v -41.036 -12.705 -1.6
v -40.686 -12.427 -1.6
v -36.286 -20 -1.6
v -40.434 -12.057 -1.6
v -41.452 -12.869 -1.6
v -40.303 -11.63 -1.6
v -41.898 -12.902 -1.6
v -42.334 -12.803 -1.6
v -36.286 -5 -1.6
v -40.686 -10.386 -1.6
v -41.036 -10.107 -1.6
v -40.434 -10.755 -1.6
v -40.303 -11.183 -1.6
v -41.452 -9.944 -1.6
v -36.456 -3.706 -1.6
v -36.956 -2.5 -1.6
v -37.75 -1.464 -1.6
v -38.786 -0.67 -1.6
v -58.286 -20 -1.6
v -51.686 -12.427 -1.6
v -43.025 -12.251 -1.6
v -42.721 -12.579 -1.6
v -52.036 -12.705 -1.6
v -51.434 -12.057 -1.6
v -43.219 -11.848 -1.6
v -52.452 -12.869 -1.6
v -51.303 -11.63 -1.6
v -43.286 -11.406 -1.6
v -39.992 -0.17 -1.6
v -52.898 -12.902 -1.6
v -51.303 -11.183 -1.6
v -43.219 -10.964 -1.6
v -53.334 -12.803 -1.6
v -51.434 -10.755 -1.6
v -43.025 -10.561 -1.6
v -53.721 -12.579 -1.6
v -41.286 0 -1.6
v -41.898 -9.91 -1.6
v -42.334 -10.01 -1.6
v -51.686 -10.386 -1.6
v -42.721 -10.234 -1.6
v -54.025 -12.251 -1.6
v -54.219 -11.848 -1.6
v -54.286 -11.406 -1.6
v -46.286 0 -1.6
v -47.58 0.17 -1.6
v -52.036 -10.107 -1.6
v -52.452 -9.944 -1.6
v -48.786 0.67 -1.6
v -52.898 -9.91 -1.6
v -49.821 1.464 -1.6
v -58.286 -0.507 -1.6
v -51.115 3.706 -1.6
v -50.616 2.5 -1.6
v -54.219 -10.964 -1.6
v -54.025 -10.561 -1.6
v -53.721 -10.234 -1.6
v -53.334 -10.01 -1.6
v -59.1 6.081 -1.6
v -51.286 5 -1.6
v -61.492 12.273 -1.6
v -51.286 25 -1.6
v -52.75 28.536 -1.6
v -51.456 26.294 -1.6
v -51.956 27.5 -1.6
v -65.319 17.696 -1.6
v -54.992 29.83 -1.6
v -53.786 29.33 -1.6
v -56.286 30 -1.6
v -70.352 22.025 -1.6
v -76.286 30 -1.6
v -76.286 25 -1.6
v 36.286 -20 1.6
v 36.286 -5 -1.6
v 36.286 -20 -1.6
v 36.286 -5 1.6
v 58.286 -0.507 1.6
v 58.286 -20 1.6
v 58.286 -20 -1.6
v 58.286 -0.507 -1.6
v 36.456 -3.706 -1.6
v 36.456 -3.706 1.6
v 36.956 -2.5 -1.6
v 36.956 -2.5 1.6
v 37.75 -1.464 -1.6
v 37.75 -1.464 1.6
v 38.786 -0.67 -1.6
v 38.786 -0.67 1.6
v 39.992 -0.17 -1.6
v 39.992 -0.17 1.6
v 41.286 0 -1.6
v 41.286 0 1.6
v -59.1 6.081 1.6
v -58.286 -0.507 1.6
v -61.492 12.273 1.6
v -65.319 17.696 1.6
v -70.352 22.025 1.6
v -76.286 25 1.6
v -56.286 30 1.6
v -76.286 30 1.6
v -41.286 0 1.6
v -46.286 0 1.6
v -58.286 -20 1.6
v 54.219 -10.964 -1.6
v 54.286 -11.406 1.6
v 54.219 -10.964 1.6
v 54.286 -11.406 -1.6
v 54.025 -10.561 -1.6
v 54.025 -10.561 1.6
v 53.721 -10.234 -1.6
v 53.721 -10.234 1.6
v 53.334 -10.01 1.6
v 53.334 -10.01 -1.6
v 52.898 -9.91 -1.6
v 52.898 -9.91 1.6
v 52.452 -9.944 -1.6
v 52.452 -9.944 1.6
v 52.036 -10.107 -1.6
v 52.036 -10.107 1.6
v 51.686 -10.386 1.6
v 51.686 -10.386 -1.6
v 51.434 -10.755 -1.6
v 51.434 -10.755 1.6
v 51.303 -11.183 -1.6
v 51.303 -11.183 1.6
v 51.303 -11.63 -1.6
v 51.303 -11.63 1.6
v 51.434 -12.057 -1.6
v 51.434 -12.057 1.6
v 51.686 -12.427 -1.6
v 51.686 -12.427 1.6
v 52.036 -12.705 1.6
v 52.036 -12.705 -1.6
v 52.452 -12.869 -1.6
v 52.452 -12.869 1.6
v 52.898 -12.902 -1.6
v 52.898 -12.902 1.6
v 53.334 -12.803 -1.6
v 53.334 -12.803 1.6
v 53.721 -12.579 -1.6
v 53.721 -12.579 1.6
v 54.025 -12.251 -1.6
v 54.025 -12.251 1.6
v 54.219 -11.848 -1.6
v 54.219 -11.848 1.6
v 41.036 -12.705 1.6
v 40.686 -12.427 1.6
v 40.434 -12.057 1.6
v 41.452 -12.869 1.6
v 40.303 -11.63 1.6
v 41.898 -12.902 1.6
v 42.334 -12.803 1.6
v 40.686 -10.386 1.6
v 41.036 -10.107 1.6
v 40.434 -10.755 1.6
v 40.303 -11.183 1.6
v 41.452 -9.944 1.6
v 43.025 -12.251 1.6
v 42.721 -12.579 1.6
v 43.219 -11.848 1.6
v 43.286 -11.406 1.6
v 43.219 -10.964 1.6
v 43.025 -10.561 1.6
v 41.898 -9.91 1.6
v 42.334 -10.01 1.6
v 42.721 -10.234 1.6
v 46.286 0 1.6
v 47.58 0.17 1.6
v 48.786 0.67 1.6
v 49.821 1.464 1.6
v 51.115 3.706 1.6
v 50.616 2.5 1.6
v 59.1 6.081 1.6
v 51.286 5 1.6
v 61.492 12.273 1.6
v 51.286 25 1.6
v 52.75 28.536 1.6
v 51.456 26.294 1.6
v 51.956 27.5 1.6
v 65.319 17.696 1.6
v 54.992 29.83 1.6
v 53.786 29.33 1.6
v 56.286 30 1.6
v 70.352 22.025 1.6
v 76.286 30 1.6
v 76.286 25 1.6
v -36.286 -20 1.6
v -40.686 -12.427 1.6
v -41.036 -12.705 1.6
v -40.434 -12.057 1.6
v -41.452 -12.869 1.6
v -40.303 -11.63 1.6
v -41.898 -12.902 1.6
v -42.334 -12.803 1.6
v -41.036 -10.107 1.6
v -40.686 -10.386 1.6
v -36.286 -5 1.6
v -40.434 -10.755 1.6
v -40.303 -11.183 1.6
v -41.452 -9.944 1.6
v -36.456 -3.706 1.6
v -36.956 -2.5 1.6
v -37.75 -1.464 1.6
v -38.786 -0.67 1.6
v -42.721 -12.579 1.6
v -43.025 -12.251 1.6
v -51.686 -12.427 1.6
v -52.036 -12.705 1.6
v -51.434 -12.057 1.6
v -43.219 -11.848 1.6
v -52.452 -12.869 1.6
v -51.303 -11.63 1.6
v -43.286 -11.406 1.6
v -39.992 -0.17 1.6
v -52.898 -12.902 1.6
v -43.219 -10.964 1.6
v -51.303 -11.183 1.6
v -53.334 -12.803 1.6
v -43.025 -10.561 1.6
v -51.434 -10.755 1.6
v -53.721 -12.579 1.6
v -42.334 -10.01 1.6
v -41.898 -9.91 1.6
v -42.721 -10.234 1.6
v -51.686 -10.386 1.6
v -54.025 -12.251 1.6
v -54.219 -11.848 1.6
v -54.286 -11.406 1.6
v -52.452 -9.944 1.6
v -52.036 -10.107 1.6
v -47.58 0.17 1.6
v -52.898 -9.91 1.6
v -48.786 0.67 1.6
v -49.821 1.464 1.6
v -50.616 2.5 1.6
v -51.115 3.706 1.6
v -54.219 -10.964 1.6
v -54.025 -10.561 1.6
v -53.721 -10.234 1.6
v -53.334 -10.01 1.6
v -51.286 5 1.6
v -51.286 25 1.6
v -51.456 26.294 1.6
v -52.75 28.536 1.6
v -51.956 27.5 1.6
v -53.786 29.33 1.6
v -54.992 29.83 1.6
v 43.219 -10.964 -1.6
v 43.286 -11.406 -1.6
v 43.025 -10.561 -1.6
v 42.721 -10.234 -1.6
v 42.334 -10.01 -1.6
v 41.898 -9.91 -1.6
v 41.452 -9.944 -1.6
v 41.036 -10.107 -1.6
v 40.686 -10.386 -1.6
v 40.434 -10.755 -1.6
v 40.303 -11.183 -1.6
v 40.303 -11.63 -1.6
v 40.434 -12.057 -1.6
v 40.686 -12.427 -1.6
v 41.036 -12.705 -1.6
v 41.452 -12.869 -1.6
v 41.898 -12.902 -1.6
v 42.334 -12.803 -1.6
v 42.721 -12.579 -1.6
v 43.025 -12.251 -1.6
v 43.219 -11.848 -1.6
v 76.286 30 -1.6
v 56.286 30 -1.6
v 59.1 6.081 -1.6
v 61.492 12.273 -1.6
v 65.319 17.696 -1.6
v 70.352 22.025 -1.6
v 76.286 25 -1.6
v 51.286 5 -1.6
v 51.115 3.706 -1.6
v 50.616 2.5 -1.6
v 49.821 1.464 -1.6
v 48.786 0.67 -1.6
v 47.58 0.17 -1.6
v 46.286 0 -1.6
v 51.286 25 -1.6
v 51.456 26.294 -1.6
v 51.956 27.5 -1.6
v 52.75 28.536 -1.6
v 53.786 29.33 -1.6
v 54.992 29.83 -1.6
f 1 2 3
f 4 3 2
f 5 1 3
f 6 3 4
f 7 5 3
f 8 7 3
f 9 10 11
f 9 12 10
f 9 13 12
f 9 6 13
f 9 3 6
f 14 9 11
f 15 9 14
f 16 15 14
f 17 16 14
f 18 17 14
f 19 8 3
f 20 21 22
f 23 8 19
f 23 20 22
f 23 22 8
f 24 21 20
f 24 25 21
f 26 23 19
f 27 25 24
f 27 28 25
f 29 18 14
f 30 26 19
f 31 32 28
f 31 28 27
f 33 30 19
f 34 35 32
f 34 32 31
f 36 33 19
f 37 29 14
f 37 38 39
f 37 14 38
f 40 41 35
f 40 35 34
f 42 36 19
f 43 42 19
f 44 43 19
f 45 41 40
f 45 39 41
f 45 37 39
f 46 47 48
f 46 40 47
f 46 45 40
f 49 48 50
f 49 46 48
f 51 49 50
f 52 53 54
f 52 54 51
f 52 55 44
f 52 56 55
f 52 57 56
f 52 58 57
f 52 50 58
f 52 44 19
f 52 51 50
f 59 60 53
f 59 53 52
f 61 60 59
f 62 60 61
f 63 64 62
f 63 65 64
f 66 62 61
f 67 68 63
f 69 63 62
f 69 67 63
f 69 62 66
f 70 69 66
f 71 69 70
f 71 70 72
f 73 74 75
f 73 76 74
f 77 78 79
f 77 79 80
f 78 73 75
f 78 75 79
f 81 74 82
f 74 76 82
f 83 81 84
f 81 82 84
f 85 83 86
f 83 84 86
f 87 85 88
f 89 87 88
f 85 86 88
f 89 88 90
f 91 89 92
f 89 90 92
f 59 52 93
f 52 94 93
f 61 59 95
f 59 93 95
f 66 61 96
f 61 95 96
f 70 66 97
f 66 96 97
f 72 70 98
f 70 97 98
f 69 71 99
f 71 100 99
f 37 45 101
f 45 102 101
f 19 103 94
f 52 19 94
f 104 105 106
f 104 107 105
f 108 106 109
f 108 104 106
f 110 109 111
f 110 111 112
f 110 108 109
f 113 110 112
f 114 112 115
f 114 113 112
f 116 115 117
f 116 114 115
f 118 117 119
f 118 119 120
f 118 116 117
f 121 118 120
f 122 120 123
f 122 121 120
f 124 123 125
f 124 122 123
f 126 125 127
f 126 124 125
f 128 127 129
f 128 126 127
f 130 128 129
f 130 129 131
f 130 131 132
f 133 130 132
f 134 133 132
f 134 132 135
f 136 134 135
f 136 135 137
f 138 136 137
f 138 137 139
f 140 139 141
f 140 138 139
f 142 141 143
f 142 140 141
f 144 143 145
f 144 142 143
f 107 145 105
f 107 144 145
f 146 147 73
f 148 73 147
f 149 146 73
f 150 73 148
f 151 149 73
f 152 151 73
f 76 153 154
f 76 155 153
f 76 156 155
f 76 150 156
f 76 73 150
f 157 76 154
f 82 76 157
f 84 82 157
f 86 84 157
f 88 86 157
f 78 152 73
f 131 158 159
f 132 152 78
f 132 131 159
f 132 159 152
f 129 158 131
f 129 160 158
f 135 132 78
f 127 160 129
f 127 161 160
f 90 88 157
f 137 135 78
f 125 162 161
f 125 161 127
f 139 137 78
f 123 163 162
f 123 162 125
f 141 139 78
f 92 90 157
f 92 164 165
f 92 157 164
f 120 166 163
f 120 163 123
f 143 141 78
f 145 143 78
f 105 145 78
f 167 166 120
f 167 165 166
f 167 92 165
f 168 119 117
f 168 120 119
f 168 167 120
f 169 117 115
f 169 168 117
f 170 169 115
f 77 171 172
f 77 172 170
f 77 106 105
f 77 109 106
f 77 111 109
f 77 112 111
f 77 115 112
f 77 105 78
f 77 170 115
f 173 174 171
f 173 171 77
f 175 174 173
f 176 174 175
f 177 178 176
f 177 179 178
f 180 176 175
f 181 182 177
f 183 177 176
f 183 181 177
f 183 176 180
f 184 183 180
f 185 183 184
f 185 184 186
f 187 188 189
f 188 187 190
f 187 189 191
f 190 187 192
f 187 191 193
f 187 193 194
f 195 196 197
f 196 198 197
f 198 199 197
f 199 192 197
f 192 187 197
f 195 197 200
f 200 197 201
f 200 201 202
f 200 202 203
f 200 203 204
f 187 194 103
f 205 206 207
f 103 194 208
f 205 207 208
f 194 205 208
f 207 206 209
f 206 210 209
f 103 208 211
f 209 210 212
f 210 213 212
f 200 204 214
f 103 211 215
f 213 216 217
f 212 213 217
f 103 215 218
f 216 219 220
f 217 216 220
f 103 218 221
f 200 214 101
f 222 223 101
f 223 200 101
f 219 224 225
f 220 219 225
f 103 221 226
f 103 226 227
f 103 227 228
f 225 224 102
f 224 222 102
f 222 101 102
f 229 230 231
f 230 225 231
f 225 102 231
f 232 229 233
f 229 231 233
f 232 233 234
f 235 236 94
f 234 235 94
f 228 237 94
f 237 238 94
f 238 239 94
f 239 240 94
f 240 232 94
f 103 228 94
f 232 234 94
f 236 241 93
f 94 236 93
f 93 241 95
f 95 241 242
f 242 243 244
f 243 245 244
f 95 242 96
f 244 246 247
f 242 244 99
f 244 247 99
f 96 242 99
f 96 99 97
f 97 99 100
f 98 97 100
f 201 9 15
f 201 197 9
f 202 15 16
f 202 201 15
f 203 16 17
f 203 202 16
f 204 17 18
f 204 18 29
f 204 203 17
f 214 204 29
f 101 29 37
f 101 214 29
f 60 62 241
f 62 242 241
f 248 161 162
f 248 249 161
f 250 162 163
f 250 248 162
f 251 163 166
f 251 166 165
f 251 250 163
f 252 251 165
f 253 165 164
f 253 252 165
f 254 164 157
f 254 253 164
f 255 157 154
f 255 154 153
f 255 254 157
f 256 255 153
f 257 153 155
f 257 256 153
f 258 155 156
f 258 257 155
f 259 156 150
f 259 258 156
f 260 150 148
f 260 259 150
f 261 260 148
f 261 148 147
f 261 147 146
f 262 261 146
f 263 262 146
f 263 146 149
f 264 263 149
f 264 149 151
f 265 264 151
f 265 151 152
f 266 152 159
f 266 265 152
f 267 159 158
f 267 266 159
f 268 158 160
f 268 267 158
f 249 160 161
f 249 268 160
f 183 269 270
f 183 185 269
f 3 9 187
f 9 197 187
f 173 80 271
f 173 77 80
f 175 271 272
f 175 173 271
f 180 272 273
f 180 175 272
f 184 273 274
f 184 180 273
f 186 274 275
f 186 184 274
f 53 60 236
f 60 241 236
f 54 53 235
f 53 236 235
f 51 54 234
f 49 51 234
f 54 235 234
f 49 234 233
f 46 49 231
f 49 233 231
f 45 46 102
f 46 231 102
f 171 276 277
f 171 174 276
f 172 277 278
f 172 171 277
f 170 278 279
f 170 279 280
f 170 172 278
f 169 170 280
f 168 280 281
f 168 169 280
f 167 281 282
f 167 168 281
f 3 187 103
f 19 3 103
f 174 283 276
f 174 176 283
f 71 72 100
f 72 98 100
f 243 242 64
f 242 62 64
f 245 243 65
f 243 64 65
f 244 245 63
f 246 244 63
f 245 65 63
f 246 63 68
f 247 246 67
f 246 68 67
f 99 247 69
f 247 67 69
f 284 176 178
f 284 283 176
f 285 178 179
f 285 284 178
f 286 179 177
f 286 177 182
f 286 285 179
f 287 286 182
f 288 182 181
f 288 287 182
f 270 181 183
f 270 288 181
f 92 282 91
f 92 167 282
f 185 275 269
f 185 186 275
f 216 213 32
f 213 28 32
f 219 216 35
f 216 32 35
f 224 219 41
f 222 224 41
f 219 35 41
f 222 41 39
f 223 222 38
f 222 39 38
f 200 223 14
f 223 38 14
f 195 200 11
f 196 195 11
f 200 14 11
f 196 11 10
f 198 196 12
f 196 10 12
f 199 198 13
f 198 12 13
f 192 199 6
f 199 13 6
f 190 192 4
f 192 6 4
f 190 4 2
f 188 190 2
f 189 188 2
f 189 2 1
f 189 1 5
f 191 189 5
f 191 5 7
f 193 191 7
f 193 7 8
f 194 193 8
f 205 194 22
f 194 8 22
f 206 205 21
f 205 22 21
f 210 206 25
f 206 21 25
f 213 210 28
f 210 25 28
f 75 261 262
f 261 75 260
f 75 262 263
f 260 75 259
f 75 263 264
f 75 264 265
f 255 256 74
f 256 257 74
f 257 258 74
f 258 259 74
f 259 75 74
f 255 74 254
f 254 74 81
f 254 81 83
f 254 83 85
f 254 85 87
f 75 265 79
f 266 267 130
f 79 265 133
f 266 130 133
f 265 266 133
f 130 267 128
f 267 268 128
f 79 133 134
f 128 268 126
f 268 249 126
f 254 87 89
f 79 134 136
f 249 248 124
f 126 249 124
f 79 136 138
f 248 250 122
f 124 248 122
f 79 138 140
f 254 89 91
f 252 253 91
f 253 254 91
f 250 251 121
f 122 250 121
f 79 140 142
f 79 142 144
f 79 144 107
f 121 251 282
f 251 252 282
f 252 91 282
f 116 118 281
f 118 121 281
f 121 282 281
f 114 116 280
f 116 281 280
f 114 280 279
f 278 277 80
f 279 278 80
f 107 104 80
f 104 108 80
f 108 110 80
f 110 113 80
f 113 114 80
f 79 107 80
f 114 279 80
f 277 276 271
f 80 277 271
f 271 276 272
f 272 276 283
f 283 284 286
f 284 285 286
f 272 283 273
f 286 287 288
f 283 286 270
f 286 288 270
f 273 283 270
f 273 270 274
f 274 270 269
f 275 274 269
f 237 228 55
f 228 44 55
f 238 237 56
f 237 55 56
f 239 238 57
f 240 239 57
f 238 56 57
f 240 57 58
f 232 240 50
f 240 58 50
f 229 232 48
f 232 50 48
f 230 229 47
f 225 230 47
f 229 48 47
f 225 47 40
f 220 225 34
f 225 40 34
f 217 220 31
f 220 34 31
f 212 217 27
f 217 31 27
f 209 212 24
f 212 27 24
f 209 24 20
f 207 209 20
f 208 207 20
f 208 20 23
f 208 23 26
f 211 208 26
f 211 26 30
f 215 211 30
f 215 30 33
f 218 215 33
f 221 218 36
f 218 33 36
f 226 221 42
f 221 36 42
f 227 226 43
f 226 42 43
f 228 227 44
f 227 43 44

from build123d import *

# Parameters (mm, degrees)
F0_R     = 1.5
F1_DEPTH = 1.6
F2_R     = 5


with BuildPart() as f1:
    # F0 (on Top) → F1 (new body, symmetric)
    with BuildSketch(Plane.XY):
        with BuildLine():
            Line((51.2858437002, 30), (51.2858437002, 0))
            Line((51.2858437002, 0), (36.2858437002, 0))
            Line((36.2858437002, 0), (36.2858437002, -10))
            Line((36.2858437002, -10), (36.2858437002, -20))
            Line((36.2858437002, -20), (58.2858437002, -20))
            Line((58.2858437002, -20), (58.2858437002, -10))
            Line((58.2858437002, -10), (58.2858437002, -0.5072346903))
            ThreePointArc((58.2858437002, -0.5072346903), (63.2389408298, 15.1022097389), (76.2858437002, 25))
            Line((76.2858437002, 25), (76.2858437002, 30))
            Line((76.2858437002, 30), (51.2858437002, 30))
        make_face()
        with Locations((41.7858437002, -11.40625)):
            Circle(F0_R, mode=Mode.SUBTRACT)
        with Locations((52.7858437002, -11.40625)):
            Circle(F0_R, mode=Mode.SUBTRACT)
    extrude(amount=F1_DEPTH, both=True)

    # F2
    f2_edges = [f1.edges().sort_by_distance(p)[0] for p in [
        (51.285844, 30, 0),
        (51.285844, 0, 0),
        (36.285844, 0, 0),
    ]]
    fillet(f2_edges, radius=F2_R)


with BuildPart() as f3_1:
    # F3: instance of F1
    add(f1.part.mirror(Plane.YZ))


solid = Compound([f1.part, f3_1.part])
